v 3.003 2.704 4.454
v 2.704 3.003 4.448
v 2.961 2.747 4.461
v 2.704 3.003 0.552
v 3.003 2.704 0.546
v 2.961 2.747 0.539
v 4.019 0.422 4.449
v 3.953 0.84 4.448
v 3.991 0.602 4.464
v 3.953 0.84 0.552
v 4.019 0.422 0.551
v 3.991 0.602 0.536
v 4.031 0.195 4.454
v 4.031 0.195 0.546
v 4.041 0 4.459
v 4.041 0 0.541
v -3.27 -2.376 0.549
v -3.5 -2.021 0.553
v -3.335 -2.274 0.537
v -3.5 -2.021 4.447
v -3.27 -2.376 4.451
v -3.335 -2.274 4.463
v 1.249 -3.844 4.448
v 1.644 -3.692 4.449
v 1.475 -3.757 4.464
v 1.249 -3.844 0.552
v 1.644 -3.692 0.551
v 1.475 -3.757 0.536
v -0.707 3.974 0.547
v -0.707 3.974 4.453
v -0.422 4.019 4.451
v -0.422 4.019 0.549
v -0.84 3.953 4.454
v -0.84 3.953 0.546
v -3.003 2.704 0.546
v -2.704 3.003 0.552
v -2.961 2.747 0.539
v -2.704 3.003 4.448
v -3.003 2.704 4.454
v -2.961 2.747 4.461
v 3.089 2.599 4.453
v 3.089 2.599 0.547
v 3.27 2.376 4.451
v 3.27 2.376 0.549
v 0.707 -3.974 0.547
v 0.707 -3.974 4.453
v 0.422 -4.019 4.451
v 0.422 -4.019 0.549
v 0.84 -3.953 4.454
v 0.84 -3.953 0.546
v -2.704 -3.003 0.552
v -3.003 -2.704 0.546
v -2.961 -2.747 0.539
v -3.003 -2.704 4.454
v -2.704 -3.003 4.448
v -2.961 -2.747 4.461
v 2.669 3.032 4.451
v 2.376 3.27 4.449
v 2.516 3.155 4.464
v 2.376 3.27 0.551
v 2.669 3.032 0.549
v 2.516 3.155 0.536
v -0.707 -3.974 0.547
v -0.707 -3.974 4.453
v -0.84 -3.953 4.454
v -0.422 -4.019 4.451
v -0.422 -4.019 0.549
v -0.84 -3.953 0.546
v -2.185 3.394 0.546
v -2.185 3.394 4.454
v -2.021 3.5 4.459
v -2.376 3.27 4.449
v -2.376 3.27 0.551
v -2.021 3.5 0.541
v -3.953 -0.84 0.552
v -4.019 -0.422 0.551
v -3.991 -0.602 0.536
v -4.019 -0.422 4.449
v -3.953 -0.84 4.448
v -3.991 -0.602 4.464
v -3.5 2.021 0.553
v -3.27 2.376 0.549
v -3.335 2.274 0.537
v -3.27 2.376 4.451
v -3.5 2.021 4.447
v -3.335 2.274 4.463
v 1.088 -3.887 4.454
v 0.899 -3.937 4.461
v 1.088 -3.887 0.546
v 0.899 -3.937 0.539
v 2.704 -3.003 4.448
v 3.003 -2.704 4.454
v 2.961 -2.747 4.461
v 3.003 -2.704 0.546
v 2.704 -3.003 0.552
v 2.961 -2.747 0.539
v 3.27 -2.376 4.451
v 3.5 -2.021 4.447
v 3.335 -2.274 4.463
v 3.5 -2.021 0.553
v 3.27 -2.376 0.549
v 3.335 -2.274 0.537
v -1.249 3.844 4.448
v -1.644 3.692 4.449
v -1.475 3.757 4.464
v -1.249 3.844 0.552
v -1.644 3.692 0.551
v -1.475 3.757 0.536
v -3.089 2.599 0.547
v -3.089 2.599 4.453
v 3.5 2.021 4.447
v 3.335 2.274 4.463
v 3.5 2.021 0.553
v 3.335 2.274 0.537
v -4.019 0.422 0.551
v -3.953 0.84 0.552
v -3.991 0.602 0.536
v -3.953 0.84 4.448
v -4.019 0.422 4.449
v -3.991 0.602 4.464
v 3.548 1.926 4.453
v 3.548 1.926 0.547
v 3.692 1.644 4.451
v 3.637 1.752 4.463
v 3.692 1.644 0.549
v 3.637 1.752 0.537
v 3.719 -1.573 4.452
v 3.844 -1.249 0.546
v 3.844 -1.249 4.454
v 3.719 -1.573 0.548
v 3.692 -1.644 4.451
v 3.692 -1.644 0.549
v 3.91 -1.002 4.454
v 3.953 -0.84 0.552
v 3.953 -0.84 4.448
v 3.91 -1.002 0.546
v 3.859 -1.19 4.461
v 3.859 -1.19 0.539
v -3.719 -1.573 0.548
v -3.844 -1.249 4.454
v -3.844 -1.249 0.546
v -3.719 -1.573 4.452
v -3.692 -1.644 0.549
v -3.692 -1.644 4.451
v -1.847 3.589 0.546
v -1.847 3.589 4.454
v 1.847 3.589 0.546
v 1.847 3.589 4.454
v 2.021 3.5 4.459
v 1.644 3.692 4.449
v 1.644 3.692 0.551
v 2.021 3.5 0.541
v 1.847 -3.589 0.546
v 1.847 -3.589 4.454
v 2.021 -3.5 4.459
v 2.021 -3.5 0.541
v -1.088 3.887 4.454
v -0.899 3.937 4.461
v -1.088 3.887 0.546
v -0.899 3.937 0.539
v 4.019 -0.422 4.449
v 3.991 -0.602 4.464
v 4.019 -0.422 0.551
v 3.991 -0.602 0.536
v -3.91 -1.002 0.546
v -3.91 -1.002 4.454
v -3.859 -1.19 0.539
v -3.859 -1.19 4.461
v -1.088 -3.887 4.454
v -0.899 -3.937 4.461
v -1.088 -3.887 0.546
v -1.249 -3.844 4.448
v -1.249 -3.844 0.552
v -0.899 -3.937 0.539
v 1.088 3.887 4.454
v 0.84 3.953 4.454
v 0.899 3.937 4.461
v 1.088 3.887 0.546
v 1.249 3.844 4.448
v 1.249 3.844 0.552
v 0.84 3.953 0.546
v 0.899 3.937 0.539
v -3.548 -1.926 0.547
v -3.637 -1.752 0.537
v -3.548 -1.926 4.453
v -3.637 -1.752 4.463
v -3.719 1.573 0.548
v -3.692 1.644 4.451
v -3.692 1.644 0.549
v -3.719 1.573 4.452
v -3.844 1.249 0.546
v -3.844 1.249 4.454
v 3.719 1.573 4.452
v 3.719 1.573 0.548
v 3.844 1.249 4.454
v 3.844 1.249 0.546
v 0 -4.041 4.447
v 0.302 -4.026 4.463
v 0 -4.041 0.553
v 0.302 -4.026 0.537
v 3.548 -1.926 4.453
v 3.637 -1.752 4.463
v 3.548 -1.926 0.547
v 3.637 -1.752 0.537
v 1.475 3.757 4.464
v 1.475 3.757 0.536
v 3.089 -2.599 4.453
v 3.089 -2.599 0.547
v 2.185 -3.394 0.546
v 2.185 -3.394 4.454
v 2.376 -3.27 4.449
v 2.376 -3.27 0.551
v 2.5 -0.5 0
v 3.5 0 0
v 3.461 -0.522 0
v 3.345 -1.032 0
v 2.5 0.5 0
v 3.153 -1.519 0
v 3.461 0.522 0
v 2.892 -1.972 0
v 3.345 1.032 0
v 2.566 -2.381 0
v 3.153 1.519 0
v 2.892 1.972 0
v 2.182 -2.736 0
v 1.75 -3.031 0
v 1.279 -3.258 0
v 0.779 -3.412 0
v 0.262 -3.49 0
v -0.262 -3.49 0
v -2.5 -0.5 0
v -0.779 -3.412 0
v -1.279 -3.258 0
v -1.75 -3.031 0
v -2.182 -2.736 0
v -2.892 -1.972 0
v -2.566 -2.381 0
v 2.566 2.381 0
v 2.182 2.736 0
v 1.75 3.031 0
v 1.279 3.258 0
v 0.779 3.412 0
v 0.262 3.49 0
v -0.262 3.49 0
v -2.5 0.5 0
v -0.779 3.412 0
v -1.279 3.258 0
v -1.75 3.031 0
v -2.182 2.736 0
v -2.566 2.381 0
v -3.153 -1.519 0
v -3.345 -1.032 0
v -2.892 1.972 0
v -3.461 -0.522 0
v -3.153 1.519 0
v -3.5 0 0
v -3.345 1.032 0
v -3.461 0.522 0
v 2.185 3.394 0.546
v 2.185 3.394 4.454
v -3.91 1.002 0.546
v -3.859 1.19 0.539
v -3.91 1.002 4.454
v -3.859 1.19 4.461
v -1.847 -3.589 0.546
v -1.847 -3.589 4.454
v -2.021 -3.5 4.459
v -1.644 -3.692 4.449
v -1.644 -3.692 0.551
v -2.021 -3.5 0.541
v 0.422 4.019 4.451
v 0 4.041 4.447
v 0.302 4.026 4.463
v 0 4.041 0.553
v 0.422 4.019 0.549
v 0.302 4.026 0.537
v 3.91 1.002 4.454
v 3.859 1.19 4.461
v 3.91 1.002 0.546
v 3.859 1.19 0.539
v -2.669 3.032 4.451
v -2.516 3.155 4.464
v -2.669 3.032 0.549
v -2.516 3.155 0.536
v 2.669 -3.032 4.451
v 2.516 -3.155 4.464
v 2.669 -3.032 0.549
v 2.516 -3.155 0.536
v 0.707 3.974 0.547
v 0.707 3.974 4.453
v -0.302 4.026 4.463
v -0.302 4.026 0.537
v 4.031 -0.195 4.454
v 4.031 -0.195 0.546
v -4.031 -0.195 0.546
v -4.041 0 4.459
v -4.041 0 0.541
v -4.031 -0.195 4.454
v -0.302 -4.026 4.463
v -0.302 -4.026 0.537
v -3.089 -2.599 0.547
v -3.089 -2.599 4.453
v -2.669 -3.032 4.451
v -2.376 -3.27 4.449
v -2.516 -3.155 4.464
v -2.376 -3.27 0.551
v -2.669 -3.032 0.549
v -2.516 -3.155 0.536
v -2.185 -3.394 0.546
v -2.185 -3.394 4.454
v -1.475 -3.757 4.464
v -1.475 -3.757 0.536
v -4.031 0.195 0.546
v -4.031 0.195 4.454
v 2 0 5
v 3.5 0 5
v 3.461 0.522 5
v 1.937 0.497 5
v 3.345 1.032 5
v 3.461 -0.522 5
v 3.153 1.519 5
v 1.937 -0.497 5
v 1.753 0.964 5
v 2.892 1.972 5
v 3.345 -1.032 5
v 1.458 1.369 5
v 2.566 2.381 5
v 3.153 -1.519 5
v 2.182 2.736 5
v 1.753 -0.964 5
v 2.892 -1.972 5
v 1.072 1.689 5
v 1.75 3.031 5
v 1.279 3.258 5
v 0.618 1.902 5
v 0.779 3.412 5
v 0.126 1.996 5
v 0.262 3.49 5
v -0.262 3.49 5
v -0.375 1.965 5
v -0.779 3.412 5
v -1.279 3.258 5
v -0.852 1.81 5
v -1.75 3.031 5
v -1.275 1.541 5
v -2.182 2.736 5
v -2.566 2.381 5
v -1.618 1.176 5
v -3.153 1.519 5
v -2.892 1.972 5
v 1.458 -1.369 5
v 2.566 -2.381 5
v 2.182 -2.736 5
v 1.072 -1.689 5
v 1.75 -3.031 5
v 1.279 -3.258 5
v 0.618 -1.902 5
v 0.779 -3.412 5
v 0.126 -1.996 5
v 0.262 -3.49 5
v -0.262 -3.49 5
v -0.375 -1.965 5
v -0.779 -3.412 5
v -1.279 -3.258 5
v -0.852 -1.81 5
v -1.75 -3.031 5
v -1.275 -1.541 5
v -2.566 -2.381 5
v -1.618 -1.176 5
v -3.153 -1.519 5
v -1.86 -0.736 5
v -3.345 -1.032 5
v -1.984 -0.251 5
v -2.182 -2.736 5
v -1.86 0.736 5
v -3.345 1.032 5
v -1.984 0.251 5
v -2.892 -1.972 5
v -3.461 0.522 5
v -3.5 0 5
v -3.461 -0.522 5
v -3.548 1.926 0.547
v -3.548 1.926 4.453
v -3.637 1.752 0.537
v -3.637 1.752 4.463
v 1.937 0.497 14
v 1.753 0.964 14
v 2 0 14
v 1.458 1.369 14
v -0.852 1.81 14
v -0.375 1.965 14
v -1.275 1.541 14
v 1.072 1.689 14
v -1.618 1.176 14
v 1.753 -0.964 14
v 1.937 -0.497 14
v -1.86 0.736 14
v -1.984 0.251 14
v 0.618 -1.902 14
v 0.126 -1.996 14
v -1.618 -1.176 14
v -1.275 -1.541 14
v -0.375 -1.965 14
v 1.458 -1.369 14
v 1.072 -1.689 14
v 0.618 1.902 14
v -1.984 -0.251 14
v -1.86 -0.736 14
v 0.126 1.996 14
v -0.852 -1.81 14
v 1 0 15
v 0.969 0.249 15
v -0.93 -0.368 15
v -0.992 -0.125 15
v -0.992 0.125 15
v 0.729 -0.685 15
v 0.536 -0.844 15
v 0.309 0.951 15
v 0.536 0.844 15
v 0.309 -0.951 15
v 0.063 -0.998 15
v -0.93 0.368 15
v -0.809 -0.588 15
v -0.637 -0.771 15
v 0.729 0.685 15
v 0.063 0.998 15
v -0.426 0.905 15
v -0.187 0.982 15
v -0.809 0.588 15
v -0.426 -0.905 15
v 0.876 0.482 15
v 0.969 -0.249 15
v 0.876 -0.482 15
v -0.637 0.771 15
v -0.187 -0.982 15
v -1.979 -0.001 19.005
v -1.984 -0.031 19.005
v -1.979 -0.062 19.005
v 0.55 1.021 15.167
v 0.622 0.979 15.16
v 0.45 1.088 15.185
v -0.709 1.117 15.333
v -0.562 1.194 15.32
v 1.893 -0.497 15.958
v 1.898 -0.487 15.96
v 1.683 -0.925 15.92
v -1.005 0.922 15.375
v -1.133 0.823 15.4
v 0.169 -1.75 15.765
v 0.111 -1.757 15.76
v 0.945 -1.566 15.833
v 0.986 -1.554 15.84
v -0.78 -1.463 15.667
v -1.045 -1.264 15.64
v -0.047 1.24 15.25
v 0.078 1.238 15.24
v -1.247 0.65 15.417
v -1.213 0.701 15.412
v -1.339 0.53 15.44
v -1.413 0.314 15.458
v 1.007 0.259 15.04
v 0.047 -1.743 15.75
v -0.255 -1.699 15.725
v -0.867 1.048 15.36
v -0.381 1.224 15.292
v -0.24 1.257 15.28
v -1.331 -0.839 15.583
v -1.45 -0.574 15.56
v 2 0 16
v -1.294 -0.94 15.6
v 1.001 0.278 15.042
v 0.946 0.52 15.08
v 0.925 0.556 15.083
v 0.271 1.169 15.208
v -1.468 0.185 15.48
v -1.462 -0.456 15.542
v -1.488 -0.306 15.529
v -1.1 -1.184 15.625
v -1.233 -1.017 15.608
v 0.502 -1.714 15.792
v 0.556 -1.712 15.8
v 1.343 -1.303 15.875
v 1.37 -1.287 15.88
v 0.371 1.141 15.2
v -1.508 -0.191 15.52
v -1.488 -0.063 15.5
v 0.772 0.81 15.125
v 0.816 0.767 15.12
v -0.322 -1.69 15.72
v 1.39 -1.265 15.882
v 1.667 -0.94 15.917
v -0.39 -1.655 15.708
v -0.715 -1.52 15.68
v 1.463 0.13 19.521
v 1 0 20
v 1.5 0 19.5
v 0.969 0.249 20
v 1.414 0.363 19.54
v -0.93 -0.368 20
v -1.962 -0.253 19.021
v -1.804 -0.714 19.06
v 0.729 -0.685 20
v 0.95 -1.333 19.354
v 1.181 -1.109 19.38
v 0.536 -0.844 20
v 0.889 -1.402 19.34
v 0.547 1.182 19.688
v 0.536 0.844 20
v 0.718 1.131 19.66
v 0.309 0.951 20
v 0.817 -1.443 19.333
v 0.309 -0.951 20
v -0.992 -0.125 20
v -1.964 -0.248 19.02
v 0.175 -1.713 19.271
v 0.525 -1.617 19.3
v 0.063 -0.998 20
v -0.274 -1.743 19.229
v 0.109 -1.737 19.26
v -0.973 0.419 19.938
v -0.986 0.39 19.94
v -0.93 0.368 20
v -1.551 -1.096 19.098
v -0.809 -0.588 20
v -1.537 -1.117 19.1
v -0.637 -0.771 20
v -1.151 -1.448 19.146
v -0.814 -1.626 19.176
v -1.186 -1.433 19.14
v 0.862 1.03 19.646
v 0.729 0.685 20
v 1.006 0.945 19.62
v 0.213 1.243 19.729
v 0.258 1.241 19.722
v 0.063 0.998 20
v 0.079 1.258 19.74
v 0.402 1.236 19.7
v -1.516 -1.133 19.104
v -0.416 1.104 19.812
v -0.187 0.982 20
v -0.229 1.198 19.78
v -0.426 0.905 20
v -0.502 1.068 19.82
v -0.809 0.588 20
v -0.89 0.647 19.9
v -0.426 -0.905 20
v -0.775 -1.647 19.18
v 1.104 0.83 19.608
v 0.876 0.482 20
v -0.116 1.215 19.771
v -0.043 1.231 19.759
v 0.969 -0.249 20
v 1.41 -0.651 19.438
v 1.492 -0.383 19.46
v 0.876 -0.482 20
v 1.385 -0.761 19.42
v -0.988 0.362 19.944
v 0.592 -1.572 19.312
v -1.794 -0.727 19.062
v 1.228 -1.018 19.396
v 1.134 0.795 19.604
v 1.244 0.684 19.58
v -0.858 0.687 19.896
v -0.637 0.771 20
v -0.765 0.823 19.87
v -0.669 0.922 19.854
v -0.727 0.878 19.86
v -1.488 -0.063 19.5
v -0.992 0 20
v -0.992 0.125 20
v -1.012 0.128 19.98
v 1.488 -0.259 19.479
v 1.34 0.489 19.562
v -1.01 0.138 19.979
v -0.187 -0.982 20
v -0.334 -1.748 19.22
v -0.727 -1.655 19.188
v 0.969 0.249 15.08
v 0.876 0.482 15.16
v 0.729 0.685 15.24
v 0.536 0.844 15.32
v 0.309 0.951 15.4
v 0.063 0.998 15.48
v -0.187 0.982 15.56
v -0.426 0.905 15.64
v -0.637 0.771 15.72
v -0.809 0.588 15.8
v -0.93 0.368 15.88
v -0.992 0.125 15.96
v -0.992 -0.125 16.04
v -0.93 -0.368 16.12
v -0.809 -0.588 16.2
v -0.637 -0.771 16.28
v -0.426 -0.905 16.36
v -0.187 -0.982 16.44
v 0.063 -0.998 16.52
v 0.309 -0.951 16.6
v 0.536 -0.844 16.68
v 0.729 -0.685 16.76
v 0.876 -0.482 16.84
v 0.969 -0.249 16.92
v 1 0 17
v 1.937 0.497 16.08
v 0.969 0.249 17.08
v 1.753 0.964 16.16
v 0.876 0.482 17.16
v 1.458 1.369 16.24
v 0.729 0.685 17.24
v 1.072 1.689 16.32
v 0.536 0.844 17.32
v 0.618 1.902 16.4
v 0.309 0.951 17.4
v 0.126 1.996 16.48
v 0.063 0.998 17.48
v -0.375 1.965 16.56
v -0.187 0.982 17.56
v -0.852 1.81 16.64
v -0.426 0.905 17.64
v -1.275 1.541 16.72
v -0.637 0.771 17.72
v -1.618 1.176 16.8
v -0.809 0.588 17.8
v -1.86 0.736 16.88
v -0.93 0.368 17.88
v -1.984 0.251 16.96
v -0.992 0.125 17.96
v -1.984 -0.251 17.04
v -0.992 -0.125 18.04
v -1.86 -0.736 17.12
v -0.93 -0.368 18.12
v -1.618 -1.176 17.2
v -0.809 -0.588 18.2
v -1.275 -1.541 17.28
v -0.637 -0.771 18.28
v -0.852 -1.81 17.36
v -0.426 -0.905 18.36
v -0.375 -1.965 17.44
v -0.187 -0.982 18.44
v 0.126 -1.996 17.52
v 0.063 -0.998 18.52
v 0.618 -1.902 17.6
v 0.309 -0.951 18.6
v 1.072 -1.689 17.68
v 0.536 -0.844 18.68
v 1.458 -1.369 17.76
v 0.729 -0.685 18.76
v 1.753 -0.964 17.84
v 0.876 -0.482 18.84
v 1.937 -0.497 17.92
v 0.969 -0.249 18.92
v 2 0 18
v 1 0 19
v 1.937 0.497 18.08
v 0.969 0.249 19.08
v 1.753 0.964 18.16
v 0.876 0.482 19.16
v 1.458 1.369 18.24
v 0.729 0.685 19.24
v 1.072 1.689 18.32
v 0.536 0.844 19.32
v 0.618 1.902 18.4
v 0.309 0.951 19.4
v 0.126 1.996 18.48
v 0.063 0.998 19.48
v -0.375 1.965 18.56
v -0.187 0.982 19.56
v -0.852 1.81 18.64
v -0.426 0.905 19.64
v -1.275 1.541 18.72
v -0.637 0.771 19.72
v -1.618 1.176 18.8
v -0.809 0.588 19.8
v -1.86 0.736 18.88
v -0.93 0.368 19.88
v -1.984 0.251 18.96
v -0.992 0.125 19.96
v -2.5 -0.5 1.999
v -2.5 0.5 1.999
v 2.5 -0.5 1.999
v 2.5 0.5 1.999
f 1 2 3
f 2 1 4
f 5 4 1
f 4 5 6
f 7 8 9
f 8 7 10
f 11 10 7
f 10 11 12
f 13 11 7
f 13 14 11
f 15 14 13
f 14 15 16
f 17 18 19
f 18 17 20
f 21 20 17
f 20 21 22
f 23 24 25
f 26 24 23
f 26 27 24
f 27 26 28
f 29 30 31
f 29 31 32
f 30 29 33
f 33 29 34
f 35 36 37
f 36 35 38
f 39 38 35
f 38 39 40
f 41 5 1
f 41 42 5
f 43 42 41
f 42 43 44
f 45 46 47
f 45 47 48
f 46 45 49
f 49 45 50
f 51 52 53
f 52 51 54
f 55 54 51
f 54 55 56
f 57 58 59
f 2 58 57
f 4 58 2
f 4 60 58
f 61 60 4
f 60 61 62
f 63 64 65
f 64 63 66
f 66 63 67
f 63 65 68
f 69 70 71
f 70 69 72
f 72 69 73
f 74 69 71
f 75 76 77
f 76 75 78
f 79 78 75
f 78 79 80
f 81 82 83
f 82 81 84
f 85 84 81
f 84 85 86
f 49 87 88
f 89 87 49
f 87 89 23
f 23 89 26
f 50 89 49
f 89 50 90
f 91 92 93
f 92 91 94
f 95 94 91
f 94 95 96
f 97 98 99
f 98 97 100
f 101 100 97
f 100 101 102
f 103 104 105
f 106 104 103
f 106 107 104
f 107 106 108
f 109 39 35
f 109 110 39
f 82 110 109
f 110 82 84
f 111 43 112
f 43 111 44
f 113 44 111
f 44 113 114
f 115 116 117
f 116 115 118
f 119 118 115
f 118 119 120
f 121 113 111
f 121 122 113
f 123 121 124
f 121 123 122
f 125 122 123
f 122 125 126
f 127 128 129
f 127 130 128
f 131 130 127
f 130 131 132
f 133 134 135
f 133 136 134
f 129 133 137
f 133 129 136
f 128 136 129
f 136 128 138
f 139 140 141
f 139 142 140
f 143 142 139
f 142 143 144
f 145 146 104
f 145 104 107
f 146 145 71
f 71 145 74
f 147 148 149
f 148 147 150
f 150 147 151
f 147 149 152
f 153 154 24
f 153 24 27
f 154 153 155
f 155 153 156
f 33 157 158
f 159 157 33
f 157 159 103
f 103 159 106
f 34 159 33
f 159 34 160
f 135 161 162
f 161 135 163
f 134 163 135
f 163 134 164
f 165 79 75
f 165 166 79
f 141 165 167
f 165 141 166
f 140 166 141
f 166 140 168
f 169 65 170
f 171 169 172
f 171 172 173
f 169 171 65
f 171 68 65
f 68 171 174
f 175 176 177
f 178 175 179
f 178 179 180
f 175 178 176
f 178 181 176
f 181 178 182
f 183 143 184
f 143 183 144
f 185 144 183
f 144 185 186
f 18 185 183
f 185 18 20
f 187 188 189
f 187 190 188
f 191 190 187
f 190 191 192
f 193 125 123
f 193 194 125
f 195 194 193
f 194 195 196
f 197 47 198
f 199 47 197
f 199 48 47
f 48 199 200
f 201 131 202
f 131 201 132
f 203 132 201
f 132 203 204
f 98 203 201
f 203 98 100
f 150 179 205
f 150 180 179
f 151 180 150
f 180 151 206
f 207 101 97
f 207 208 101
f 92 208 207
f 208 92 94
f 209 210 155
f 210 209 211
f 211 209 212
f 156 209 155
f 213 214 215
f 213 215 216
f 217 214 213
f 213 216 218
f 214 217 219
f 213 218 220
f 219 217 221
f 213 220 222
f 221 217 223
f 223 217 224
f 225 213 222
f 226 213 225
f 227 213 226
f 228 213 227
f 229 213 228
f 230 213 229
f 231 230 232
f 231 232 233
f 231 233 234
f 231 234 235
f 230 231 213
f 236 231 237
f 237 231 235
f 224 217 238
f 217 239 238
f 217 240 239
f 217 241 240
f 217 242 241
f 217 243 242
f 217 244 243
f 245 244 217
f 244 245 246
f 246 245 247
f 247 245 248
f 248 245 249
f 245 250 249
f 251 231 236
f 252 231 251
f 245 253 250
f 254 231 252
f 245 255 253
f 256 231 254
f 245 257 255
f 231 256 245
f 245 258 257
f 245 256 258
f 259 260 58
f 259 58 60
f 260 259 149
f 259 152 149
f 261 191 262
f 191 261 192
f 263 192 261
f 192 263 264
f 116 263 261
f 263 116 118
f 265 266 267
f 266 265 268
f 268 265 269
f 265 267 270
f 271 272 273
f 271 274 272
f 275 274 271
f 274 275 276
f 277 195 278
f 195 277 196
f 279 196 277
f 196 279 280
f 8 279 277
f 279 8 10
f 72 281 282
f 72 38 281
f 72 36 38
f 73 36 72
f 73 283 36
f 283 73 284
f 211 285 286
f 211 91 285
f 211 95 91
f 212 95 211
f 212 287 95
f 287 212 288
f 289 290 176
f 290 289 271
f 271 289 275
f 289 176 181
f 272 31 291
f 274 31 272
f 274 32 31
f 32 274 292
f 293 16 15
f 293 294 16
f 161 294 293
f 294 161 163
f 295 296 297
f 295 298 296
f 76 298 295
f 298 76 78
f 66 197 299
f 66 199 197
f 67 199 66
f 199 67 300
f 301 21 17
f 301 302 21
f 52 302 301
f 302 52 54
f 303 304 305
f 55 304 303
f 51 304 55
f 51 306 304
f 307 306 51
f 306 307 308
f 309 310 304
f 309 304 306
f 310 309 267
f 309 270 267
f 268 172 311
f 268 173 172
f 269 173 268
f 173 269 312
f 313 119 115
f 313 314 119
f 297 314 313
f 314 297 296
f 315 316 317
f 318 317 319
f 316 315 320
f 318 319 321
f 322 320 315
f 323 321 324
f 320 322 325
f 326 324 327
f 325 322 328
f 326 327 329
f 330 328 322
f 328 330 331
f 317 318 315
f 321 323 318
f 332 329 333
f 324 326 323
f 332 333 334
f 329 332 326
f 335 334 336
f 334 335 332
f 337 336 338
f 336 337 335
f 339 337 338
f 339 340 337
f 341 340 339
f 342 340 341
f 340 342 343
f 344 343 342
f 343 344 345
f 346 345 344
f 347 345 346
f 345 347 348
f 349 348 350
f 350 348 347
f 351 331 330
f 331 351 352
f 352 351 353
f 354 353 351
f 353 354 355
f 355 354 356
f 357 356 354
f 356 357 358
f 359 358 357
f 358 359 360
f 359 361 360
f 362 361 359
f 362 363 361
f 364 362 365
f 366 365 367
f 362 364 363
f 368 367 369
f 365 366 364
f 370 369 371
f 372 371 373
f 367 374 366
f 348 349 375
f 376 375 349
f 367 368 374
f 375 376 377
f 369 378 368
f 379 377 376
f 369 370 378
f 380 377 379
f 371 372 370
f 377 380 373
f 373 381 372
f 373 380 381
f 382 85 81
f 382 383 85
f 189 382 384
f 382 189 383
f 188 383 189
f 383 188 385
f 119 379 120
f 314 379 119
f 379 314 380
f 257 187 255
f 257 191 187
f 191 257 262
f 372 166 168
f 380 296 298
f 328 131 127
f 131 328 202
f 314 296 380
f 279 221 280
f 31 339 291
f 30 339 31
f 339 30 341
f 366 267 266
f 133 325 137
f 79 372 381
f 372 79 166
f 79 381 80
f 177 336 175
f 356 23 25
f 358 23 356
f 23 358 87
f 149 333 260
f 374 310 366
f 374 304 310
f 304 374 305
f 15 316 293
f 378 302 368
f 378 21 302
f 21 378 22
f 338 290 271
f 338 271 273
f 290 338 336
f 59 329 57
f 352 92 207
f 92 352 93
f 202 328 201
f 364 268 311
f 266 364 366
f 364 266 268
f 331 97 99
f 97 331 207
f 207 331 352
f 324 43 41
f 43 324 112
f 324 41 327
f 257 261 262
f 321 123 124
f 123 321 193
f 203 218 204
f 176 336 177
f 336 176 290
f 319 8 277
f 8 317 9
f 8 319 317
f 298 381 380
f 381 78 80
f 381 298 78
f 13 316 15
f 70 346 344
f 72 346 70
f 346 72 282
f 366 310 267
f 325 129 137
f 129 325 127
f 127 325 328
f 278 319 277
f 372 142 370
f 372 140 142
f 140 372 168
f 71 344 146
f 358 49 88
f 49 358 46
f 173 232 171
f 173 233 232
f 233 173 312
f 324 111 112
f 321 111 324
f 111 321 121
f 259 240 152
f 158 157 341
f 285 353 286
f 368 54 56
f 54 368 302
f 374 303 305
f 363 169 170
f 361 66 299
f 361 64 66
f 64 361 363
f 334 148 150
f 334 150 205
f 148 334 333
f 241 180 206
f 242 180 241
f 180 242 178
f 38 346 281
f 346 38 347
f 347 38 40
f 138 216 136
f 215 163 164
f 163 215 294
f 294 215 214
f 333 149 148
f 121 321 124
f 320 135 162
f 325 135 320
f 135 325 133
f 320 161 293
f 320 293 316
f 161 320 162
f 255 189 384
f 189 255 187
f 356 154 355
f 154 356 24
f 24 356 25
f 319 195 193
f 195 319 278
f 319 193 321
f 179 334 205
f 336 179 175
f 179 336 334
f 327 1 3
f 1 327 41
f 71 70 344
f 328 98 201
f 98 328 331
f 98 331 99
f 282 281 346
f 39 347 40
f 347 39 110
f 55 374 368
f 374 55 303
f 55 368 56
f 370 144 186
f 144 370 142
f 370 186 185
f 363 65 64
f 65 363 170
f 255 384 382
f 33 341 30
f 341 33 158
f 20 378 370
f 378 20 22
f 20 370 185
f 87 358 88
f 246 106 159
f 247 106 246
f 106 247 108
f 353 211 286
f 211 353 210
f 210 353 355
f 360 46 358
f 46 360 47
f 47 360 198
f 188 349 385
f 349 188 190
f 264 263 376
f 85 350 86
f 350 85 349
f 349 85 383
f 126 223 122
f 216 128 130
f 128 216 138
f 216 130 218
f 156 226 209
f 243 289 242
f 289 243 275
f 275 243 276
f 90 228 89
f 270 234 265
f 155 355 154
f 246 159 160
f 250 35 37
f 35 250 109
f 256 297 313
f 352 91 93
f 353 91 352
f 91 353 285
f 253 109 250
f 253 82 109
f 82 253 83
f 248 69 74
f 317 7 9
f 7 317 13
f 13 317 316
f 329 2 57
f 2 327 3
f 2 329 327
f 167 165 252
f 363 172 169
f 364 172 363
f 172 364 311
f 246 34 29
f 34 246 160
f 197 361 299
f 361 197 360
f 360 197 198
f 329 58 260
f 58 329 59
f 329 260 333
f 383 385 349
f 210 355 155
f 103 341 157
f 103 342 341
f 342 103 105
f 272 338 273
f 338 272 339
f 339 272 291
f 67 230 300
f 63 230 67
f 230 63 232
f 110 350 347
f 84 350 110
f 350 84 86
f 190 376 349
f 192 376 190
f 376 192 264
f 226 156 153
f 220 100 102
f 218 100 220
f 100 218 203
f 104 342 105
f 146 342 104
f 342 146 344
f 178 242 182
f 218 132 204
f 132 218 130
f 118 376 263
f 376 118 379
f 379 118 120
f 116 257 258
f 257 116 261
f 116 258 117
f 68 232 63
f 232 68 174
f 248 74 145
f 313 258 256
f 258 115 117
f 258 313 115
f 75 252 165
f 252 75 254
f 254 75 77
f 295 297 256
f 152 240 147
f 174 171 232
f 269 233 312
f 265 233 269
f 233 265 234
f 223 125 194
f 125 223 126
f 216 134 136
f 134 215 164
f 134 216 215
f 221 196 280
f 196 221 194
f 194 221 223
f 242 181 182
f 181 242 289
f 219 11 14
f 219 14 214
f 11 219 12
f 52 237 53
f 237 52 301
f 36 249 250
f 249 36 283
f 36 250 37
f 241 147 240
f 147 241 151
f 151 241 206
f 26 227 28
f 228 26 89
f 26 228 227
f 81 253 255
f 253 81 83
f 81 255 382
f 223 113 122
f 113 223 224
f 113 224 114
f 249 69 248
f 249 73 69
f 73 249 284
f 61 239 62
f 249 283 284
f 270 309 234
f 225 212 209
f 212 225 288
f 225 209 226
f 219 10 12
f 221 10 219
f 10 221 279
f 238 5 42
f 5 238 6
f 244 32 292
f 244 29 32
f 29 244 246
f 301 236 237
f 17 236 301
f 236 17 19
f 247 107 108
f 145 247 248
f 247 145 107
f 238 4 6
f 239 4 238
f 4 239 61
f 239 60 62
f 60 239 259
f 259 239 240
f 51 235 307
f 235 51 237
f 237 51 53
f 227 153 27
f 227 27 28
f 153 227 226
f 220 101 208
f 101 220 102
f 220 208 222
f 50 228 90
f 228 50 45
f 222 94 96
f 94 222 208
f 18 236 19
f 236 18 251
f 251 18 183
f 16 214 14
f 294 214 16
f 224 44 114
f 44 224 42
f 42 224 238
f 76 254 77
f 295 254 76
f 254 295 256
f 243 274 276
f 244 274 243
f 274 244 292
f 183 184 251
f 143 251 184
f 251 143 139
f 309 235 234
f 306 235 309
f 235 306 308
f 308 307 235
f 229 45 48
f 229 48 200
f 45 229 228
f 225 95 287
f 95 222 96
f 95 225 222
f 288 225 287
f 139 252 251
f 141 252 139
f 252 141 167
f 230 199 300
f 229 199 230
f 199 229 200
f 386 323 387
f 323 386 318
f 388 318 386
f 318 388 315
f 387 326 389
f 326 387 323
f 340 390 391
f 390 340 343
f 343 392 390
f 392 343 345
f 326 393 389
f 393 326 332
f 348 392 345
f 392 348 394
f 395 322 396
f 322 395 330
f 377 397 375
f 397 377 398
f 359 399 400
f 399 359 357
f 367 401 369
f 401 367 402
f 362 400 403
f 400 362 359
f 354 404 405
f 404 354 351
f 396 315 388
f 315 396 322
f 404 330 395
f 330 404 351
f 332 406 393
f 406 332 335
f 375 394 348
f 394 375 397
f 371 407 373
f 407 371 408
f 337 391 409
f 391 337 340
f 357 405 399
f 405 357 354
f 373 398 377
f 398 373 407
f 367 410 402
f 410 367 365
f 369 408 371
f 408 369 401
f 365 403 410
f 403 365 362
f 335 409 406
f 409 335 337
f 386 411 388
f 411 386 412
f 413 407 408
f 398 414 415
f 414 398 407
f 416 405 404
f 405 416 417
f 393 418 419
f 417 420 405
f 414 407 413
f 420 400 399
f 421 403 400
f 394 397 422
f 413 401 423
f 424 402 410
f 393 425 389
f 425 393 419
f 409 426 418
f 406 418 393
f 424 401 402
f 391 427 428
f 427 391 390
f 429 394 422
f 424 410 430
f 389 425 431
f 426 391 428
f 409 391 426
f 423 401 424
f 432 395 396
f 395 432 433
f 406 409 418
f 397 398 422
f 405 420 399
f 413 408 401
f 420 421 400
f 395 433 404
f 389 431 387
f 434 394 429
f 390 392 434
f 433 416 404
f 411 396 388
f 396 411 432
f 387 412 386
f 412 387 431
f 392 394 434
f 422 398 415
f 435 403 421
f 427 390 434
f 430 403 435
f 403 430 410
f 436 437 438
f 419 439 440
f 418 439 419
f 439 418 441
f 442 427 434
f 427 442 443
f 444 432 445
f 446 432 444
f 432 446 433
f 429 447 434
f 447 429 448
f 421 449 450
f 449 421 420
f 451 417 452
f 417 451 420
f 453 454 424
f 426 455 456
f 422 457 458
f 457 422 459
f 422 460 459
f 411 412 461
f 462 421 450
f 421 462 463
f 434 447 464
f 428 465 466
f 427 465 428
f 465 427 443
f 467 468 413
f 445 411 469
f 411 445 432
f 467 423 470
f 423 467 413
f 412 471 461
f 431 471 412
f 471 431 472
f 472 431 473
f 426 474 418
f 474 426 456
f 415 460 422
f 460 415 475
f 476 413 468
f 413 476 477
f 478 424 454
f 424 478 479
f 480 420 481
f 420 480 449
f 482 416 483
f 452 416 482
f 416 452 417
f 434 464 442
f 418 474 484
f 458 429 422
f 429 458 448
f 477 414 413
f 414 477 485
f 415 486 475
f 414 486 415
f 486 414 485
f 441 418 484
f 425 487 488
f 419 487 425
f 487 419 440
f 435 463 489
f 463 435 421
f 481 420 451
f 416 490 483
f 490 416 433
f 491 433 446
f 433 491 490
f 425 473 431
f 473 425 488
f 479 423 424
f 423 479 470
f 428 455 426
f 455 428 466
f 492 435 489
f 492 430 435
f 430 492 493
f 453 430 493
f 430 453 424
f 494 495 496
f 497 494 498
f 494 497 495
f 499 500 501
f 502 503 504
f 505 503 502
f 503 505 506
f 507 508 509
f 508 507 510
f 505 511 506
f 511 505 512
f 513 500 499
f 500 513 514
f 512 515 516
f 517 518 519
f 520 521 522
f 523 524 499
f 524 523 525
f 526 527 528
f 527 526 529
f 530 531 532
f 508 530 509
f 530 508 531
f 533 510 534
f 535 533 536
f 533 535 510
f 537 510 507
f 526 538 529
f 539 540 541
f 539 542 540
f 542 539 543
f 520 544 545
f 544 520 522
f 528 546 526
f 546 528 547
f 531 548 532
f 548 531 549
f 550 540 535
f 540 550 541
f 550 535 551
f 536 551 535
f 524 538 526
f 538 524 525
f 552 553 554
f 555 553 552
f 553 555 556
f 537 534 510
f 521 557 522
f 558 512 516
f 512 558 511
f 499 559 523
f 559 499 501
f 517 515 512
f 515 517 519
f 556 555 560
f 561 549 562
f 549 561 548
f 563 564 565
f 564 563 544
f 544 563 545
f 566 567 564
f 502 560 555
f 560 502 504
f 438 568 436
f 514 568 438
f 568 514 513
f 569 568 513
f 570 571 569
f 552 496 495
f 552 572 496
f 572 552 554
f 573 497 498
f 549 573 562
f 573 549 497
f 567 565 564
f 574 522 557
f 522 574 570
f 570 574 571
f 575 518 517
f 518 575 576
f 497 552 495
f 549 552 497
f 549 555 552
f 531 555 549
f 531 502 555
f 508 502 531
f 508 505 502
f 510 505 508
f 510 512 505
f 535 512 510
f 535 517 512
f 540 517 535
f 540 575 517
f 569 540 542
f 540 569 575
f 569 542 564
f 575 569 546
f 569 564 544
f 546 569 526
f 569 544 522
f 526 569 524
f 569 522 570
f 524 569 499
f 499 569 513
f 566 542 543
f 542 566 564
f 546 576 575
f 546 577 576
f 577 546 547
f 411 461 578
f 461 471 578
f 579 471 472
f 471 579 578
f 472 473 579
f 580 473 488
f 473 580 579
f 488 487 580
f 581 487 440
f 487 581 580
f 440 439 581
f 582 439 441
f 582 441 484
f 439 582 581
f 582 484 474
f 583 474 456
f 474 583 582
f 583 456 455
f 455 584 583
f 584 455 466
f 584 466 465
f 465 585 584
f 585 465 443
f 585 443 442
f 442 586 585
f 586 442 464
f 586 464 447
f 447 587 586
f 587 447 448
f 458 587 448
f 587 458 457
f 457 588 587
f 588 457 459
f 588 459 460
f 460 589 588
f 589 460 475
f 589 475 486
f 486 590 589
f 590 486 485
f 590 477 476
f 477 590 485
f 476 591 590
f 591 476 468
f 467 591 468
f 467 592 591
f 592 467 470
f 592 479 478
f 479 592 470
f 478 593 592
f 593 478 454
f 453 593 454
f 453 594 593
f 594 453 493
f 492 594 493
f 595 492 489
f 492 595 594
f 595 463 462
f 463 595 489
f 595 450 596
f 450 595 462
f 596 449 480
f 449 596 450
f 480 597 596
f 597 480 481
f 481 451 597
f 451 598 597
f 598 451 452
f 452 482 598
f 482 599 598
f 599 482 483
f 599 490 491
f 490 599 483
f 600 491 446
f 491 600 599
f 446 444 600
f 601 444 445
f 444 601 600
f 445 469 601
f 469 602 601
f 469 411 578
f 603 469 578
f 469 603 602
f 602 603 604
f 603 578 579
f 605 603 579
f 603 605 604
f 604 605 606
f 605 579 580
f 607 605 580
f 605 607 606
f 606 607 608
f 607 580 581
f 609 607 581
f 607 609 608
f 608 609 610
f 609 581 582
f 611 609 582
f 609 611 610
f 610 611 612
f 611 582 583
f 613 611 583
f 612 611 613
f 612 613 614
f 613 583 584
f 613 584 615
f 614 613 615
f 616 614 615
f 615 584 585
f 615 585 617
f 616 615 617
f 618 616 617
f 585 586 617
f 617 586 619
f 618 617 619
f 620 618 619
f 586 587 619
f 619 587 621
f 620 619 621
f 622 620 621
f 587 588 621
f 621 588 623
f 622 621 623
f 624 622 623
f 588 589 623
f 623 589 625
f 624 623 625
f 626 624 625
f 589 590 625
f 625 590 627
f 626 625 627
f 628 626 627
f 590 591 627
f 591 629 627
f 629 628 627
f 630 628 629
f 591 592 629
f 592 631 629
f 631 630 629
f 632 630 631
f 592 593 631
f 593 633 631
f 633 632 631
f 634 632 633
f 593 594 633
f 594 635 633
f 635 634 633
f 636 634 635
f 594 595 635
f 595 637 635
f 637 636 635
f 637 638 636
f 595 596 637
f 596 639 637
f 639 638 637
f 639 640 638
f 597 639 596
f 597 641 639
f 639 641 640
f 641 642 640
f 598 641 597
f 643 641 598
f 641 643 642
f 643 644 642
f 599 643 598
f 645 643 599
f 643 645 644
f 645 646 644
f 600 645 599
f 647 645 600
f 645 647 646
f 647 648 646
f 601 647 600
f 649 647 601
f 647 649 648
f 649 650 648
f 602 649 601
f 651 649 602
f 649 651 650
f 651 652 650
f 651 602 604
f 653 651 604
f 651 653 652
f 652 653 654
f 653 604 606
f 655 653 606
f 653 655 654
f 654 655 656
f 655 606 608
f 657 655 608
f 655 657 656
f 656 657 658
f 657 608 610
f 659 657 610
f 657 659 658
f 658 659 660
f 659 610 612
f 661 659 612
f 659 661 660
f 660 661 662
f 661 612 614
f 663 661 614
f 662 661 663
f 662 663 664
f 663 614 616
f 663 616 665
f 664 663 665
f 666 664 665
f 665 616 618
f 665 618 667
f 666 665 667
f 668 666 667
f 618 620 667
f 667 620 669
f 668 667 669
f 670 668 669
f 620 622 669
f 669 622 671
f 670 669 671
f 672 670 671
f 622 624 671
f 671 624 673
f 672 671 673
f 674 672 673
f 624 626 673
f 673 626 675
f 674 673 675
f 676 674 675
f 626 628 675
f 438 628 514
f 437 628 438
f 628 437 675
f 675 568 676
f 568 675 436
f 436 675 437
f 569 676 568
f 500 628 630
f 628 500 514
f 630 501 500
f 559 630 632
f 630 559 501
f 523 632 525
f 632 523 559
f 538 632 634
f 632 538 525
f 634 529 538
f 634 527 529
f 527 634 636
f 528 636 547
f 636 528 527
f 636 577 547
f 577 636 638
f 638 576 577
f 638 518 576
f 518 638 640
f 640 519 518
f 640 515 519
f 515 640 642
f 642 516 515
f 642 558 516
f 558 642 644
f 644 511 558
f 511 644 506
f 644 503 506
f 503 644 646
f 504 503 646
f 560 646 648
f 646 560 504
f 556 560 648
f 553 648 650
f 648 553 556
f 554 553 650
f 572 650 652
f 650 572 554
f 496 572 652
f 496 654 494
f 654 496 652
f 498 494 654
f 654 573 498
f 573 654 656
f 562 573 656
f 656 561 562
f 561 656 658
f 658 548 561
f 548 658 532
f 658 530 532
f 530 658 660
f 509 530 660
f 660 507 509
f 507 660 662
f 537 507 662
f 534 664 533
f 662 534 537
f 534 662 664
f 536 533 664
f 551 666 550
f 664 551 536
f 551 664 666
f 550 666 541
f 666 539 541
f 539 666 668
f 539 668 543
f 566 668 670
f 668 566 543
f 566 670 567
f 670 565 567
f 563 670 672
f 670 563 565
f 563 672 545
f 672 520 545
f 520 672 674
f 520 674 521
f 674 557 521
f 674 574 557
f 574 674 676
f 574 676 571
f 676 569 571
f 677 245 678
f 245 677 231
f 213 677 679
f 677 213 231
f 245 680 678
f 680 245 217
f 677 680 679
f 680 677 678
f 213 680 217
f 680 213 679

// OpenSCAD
/* 'Nut Job' nut, bolt, washer and threaded rod factory by Mike Thompson 1/12/2013, Thingiverse: mike_linus
 *
 * Licensing: This work is licensed under a Creative Commons Attribution-NonCommercial-ShareAlike 3.0 Australia License.
 * Further information is available here - http://creativecommons.org/licenses/by-nc-sa/3.0/au/deed.en_GB
 *
 * v2 8/12/2013 - added socket head types
 * v3 2/11/2014 - adjusted wing nut algorithm for better behaviour with unusual nut sizes and added ISO262 metric references
 * v4 31/12/2014 - added optional texture to socket heads, added ability to change the number of facets for a hex head
 * and adjusted wingnut base level on certain nut sizes
 * v5 11/1/2015 - added phillips and slot drive types and improved texture handling 
 * v6 21/2/2015 - added wing ratio to wingnuts 
 *
 * This script generates nuts, bolts, washers and threaded rod using the library 
 * script: polyScrewThead.scad (modified/updated version polyScrewThread_r1.scad)
 * http://www.thingiverse.com/thing:8796, CC Public Domain
 *
 * Defaults are for a 8mm diameter bolts, rod, matching nuts and wing nuts that work well together
 * without cleanup or modification. Some default parameters such as the nut outer diameter are deliberately
 * altered to produce a snug fit that can still be hand tightened. This may need to be altered
 * depending on individual printer variances, slicing tools, filament etc. Suggest printing a matching
 * bolt and nut and adjusting as necessary.  Note: slow print speeds, low temperatures and solid
 * fill are recommended for best results.
 */

/* [Component Type] */

type						= "bolt";//[nut,bolt,rod,washer]

/* [Bolt and Rod Options] */

//Head type - Hex, Socket Cap, Button Socket Cap or Countersunk Socket Cap (ignored for Rod)
head_type              			        = "socket";//[hex,socket,button,countersunk]
//Drive type - Socket, Phillips, Slot (ignored for Hex head type and Rod)
drive_type              			= "slot";//[socket,phillips,slot]
//Distance between flats for the hex head or diameter for socket or button head (ignored for Rod)
head_diameter    				= 7;	
//Height of the head (ignored for Rod)
head_height  					= 5;	
//Diameter of drive type (ignored for Hex head and Rod)
drive_diameter					= 5;	
//Width of slot aperture for phillips or slot drive types
slot_width					= 1;
//Depth of slot aperture for slot drive type
slot_depth 					= 2;
//Surface texture (socket head only)
texture                                      	= "exclude";//[include,exclude]
//Outer diameter of the thread
thread_outer_diameter             		= 4;		
//Thread step or Pitch (2mm works well for most applications ref. ISO262: M3=0.5,M4=0.7,M5=0.8,M6=1,M8=1.25,M10=1.5)
thread_step    					= 2;
//Step shape degrees (45 degrees is optimised for most printers ref. ISO262: 30 degrees)
step_shape_degrees 				= 45;	
//Length of the threaded section
thread_length  					= 5;	
//Resolution (lower values for higher resolution, but may slow rendering)
resolution    					= 0.5;	
//Countersink in both ends
countersink  					= 2;	
//Length of the non-threaded section
non_thread_length				= 10;	
//Diameter for the non-threaded section (-1: Same as inner diameter of the thread, 0: Same as outer diameter of the thread, value: The given value)
non_thread_diameter				= 0;	
//Number of facets for hex head. Default is 6 for standard hex head
facets                                          = 6;

/* [Nut Options] */

//Type: Normal or WingNut
nut_type	                      	        = "normal";//[normal,wingnut]
//Distance between flats for the hex nut
nut_diameter    				= 15;	
//Height of the nut
nut_height	  				= 5;	
//Outer diameter of the bolt thread to match (usually set about 1mm larger than bolt diameter to allow easy fit - adjust to personal preferences) 
nut_thread_outer_diameter     	                = 12;		
//Thread step or Pitch (2mm works well for most applications ref. ISO262: M3=0.5,M4=0.7,M5=0.8,M6=1,M8=1.25,M10=1.5)
nut_thread_step    				= 2;
//Step shape degrees (45 degrees is optimised for most printers ref. ISO262: 30 degrees)
nut_step_shape_degrees 			        = 45;	
//Resolution (lower values for higher resolution, but may slow rendering)
nut_resolution    				= 0.5;
//Wing radius ratio.  The proportional radius of the wing on the wing nut compared to the nut height value (default = 1)
wing_ratio                                      = 1;
wing_radius=wing_ratio * nut_height;

/* [Washer Options] */

//Inner Diameter (suggest making diameter slightly larger than bolt diameter)
inner_diameter					= 8;
//Outer Diameter
outer_diameter					= 14;
//Thickness
thickness					= 2;

//Hex Bolt
if (type=="bolt" && head_type=="hex")
{
	hex_screw(thread_outer_diameter,thread_step,step_shape_degrees,thread_length,resolution,countersink,head_diameter,head_height,non_thread_length,non_thread_diameter);
}

//Rod
if (type=="rod")
{
	hex_screw(thread_outer_diameter,thread_step,step_shape_degrees,thread_length,resolution,countersink,head_diameter,0,non_thread_length,non_thread_diameter);
}

//Hex Nut (normally slightly larger outer diameter to fit on bolt correctly)
if (type=="nut" && nut_type=="normal")
{
	hex_nut(nut_diameter,nut_height,nut_thread_step,nut_step_shape_degrees,nut_thread_outer_diameter,nut_resolution);
}

//Wing Nut variation of hex nut. Cylinders added to each side of nut for easy turning - ideal for quick release applications
if (type=="nut" && nut_type=="wingnut")
{
	rotate([0,0,30])hex_nut(nut_diameter,nut_height,nut_thread_step,nut_step_shape_degrees,nut_thread_outer_diameter,nut_resolution); //nut	
	translate([(nut_diameter/2)+wing_radius-1,1.5,wing_radius/2+1])rotate([90,0,0])wing(); //attach wing
	mirror(1,0,0)translate([(nut_diameter/2)+wing_radius-1,1.5,wing_radius/2+1])rotate([90,0,0])wing(); //attach wing
}

module wing()
{
	difference()
	{
		cylinder(r=wing_radius,h=3,$fn=64); //cylinder
		union()
		{
			translate([-wing_radius,-wing_radius-1,-0.5])cube([wing_radius*2,wing_radius/2,wing_radius*2]); //remove overhang so flush with base of nut		
			rotate([0,0,90])translate([-wing_radius,wing_radius-1,-0.5])cube([wing_radius*2,wing_radius/2,wing_radius*2]); //remove overhangs so flush with side of nut		
		}
	}
}

//Washer
if (type=="washer")
{
	difference()
	{
		cylinder(r=outer_diameter/2,h=thickness,$fn=100);
		translate([0,0,-0.1])cylinder(r=inner_diameter/2,h=thickness+0.2,$fn=100);
	}
}

//Socket Head Bolt
if (type=="bolt" && head_type!="hex")
{
	socket_screw(thread_outer_diameter,thread_step,step_shape_degrees,thread_length,resolution,countersink,head_diameter,head_height,non_thread_length,non_thread_diameter);
}

module phillips_base()
{
	linear_extrude(slot_width)polygon(points=[[0,0],[(drive_diameter-slot_width)/2,9/5*(drive_diameter-slot_width)/2],[(drive_diameter+slot_width)/2,9/5*(drive_diameter-slot_width)/2],[drive_diameter,0]]);
	translate([(drive_diameter-slot_width)/2,0,(drive_diameter+slot_width)/2])rotate([0,90,0])linear_extrude(slot_width)polygon(points=[[0,0],[(drive_diameter-slot_width)/2,9/5*(drive_diameter-slot_width)/2],[(drive_diameter+slot_width)/2,9/5*(drive_diameter-slot_width)/2],[drive_diameter,0]]);
}

module phillips_fillet()
{
	union()
	{
		translate([-(drive_diameter-slot_width)/2-(slot_width/2),slot_width/2,0])rotate([90,0,0])phillips_base();
		translate([0,0,9/5*(drive_diameter-slot_width)/2])union()
		{
			inner_curve();
			rotate([0,0,90])inner_curve();
			rotate([0,0,180])inner_curve();
			rotate([0,0,270])inner_curve();
		}
	}
}

module inner_curve()
{
	translate([slot_width/2,-slot_width/2,0])rotate([0,90,0])linear_fillet(9/5*(drive_diameter-slot_width)/2,drive_diameter/10);
}

//basic 2d profile used for fillet shape
module profile(radius)
{
  difference()
  {
    square(radius);
    circle(r=radius);
  }
}

//linear fillet for use along straight edges
module linear_fillet(length,profile_radius)
{
	translate([0,-profile_radius,profile_radius])rotate([0,90,0])linear_extrude(height=length,convexity=10)profile(profile_radius);
}

module phillips_drive()
{
	intersection()
	{
		phillips_fillet();
		cylinder(9/5*(drive_diameter-slot_width)/2,drive_diameter/2+(slot_width/2),slot_width/2);
	}
}

module socket_screw(od,st,lf0,lt,rs,cs,df,hg,ntl,ntd)
{
    ntr=od/2-(st/2)*cos(lf0)/sin(lf0);
	$fn=60;

	difference()
	{
    		union()
    		{
        		if (head_type=="socket")
				{
					socket_head(hg,df);
				}
			
        		if (head_type=="button")
				{
					button_head(hg,df);				
				}

        		if (head_type=="countersunk")
				{
					countersunk_head(hg,df);				
				}

        		translate([0,0,hg])
        		if ( ntl == 0 )
        		{
          		cylinder(h=0.01, r=ntr, center=true);
        		}
        		else
        		{
            		if ( ntd == -1 )
            		{
                		cylinder(h=ntl+0.01, r=ntr, $fn=floor(od*PI/rs), center=false);
            		}
            		else if ( ntd == 0 )
            		{
                		union()
                		{
                    		cylinder(h=ntl-st/2,r=od/2, $fn=floor(od*PI/rs), center=false);
                    		translate([0,0,ntl-st/2])
                    		cylinder(h=st/2,
                             r1=od/2, r2=ntr, 
                             $fn=floor(od*PI/rs), center=false);
                		}
            		}
            		else
            		{
                		cylinder(h=ntl, r=ntd/2, $fn=ntd*PI/rs, center=false);
            		}
        		}
        		translate([0,0,ntl+hg]) screw_thread(od,st,lf0,lt,rs,cs);
    		}
		//create opening for specific drive type
		if (drive_type=="socket")
		{
			cylinder(r=drive_diameter/2,h=3.75,$fn=6); //socket
			translate([0,0,3.75])cylinder(r1=drive_diameter/2,r2=0,h=drive_diameter/2,$fn=6); //socket tapers at base to allow printing without bridging and improve socket grip
		}
		else
		{
			if (drive_type=="phillips")
			{
				translate([0,0,-0.001])phillips_drive();
			}
			else //slot
			{
				translate([-(drive_diameter)/2,slot_width/2,-0.001])rotate([90,0,0])cube([drive_diameter,slot_depth,slot_width]);
			}	
		}
	}
}

module socket_head(hg,df)
{
	texture_points=2*PI*(head_diameter/2);
	texture_offset=head_diameter/18;
	texture_radius=head_diameter/24;

	rd0=df/2/sin(60);
	x0=0;	x1=df/2;	x2=x1+hg/2;
	y0=0;	y1=hg/2;	y2=hg;

	intersection()
	{
	   	cylinder(h=hg, r=rd0, $fn=60, center=false);
		rotate_extrude(convexity=10, $fn=6*round(df*PI/6/0.5))
		polygon([ [x0,y0],[x1,y0],[x2,y1],[x1,y2],[x0,y2] ]);
	}

	if (texture=="include") //add texture to socket head. Adjust texture density and size using texture variables above 
	{
		for (i= [1:texture_points])
		{
			translate([cos(360/texture_points*i)*(head_diameter/2+texture_offset), sin(360/texture_points*i)*(head_diameter/2+texture_offset), 1 ])
			rotate([0,0,360/texture_points*i])cylinder(r=texture_radius,h=head_height*0.6,$fn=3);
		}
	}

}

module button_head(hg,df)
{
	rd0=df/2/sin(60);
	x0=0;	x1=df/2;	x2=x1+hg/2;
	y0=0;	y1=hg/2;	y2=hg;

	intersection()
	{
	   	cylinder(h=hg, r1=drive_diameter/2 + 1, r2=rd0, $fn=60, center=false);
		rotate_extrude(convexity=10, $fn=6*round(df*PI/6/0.5))
		polygon([ [x0,y0],[x1,y0],[x2,y1],[x1,y2],[x0,y2] ]);
	}
}

module countersunk_head(hg,df)
{
	rd0=df/2/sin(60);
	x0=0;	x1=df/2;	x2=x1+hg/2;
	y0=0;	y1=hg/2;	y2=hg;

	intersection()
	{
	   cylinder(h=hg, r1=rd0, r2=thread_outer_diameter/2-0.5, $fn=60, center=false);

		rotate_extrude(convexity=10, $fn=6*round(df*PI/6/0.5))
		polygon([ [x0,y0],[x1,y0],[x2,y1],[x1,y2],[x0,y2] ]);
	}
}

/* Library included below to allow customizer functionality    
 *
 *    polyScrewThread_r1.scad    by aubenc @ Thingiverse
 *
 * This script contains the library modules that can be used to generate
 * threaded rods, screws and nuts.
 *
 * http://www.thingiverse.com/thing:8796
 *
 * CC Public Domain
 */

module screw_thread(od,st,lf0,lt,rs,cs)
{
    or=od/2;
    ir=or-st/2*cos(lf0)/sin(lf0);
    pf=2*PI*or;
    sn=floor(pf/rs);
    lfxy=360/sn;
    ttn=round(lt/st+1);
    zt=st/sn;

    intersection()
    {
        if (cs >= -1)
        {
           thread_shape(cs,lt,or,ir,sn,st);
        }

        full_thread(ttn,st,sn,zt,lfxy,or,ir);
    }
}

module hex_nut(df,hg,sth,clf,cod,crs)
{

    difference()
    {
        hex_head(hg,df);

        hex_countersink_ends(sth/2,cod,clf,crs,hg);

        screw_thread(cod,sth,clf,hg,crs,-2);
    }
}


module hex_screw(od,st,lf0,lt,rs,cs,df,hg,ntl,ntd)
{
    ntr=od/2-(st/2)*cos(lf0)/sin(lf0);

    union()
    {
        hex_head(hg,df);

        translate([0,0,hg])
        if ( ntl == 0 )
        {
            cylinder(h=0.01, r=ntr, center=true);
        }
        else
        {
            if ( ntd == -1 )
            {
                cylinder(h=ntl+0.01, r=ntr, $fn=floor(od*PI/rs), center=false);
            }
            else if ( ntd == 0 )
            {
                union()
                {
                    cylinder(h=ntl-st/2,
                             r=od/2, $fn=floor(od*PI/rs), center=false);

                    translate([0,0,ntl-st/2])
                    cylinder(h=st/2,
                             r1=od/2, r2=ntr, 
                             $fn=floor(od*PI/rs), center=false);
                }
            }
            else
            {
                cylinder(h=ntl, r=ntd/2, $fn=ntd*PI/rs, center=false);
            }
        }

        translate([0,0,ntl+hg]) screw_thread(od,st,lf0,lt,rs,cs);
    }
}

module hex_screw_0(od,st,lf0,lt,rs,cs,df,hg,ntl,ntd)
{
    ntr=od/2-(st/2)*cos(lf0)/sin(lf0);

    union()
    {
        hex_head_0(hg,df);

        translate([0,0,hg])
        if ( ntl == 0 )
        {
            cylinder(h=0.01, r=ntr, center=true);
        }
        else
        {
            if ( ntd == -1 )
            {
                cylinder(h=ntl+0.01, r=ntr, $fn=floor(od*PI/rs), center=false);
            }
            else if ( ntd == 0 )
            {
                union()
                {
                    cylinder(h=ntl-st/2,
                             r=od/2, $fn=floor(od*PI/rs), center=false);

                    translate([0,0,ntl-st/2])
                    cylinder(h=st/2,
                             r1=od/2, r2=ntr, 
                             $fn=floor(od*PI/rs), center=false);
                }
            }
            else
            {
                cylinder(h=ntl, r=ntd/2, $fn=ntd*PI/rs, center=false);
            }
        }

        translate([0,0,ntl+hg]) screw_thread(od,st,lf0,lt,rs,cs);
    }
}

module thread_shape(cs,lt,or,ir,sn,st)
{
    if ( cs == 0 )
    {
        cylinder(h=lt, r=or, $fn=sn, center=false);
    }
    else
    {
        union()
        {
            translate([0,0,st/2])
              cylinder(h=lt-st+0.005, r=or, $fn=sn, center=false);

            if ( cs == -1 || cs == 2 )
            {
                cylinder(h=st/2, r1=ir, r2=or, $fn=sn, center=false);
            }
            else
            {
                cylinder(h=st/2, r=or, $fn=sn, center=false);
            }

            translate([0,0,lt-st/2])
            if ( cs == 1 || cs == 2 )
            {
                  cylinder(h=st/2, r1=or, r2=ir, $fn=sn, center=false);
            }
            else
            {
                cylinder(h=st/2, r=or, $fn=sn, center=false);
            }
        }
    }
}

module full_thread(ttn,st,sn,zt,lfxy,or,ir)
{
  if(ir >= 0.2)
  {
    for(i=[0:ttn-1])
    {
        for(j=[0:sn-1])
			assign( pt = [	[0,                  0,                  i*st-st            ],
                        [ir*cos(j*lfxy),     ir*sin(j*lfxy),     i*st+j*zt-st       ],
                        [ir*cos((j+1)*lfxy), ir*sin((j+1)*lfxy), i*st+(j+1)*zt-st   ],
								[0,0,i*st],
                        [or*cos(j*lfxy),     or*sin(j*lfxy),     i*st+j*zt-st/2     ],
                        [or*cos((j+1)*lfxy), or*sin((j+1)*lfxy), i*st+(j+1)*zt-st/2 ],
                        [ir*cos(j*lfxy),     ir*sin(j*lfxy),     i*st+j*zt          ],
                        [ir*cos((j+1)*lfxy), ir*sin((j+1)*lfxy), i*st+(j+1)*zt      ],
                        [0,                  0,                  i*st+st            ]	])
        {
            polyhedron(points=pt,
              		  triangles=[	[1,0,3],[1,3,6],[6,3,8],[1,6,4],
											[0,1,2],[1,4,2],[2,4,5],[5,4,6],[5,6,7],[7,6,8],
											[7,8,3],[0,2,3],[3,2,7],[7,2,5]	]);
        }
    }
  }
  else
  {
    echo("Step Degrees too agresive, the thread will not be made!!");
    echo("Try to increase de value for the degrees and/or...");
    echo(" decrease the pitch value and/or...");
    echo(" increase the outer diameter value.");
  }
}

module hex_head(hg,df)
{
	rd0=df/2/sin(60);
	x0=0;	x1=df/2;	x2=x1+hg/2;
	y0=0;	y1=hg/2;	y2=hg;

	intersection()
	{
	   cylinder(h=hg, r=rd0, $fn=facets, center=false);

		rotate_extrude(convexity=10, $fn=6*round(df*PI/6/0.5))
		polygon([ [x0,y0],[x1,y0],[x2,y1],[x1,y2],[x0,y2] ]);
	}
}

module hex_head_0(hg,df)
{
    cylinder(h=hg, r=df/2/sin(60), $fn=6, center=false);
}

module hex_countersink_ends(chg,cod,clf,crs,hg)
{
    translate([0,0,-0.1])
    cylinder(h=chg+0.01, 
             r1=cod/2, 
             r2=cod/2-(chg+0.1)*cos(clf)/sin(clf),
             $fn=floor(cod*PI/crs), center=false);

    translate([0,0,hg-chg+0.1])
    cylinder(h=chg+0.01, 
             r1=cod/2-(chg+0.1)*cos(clf)/sin(clf),
             r2=cod/2, 
             $fn=floor(cod*PI/crs), center=false);
}
